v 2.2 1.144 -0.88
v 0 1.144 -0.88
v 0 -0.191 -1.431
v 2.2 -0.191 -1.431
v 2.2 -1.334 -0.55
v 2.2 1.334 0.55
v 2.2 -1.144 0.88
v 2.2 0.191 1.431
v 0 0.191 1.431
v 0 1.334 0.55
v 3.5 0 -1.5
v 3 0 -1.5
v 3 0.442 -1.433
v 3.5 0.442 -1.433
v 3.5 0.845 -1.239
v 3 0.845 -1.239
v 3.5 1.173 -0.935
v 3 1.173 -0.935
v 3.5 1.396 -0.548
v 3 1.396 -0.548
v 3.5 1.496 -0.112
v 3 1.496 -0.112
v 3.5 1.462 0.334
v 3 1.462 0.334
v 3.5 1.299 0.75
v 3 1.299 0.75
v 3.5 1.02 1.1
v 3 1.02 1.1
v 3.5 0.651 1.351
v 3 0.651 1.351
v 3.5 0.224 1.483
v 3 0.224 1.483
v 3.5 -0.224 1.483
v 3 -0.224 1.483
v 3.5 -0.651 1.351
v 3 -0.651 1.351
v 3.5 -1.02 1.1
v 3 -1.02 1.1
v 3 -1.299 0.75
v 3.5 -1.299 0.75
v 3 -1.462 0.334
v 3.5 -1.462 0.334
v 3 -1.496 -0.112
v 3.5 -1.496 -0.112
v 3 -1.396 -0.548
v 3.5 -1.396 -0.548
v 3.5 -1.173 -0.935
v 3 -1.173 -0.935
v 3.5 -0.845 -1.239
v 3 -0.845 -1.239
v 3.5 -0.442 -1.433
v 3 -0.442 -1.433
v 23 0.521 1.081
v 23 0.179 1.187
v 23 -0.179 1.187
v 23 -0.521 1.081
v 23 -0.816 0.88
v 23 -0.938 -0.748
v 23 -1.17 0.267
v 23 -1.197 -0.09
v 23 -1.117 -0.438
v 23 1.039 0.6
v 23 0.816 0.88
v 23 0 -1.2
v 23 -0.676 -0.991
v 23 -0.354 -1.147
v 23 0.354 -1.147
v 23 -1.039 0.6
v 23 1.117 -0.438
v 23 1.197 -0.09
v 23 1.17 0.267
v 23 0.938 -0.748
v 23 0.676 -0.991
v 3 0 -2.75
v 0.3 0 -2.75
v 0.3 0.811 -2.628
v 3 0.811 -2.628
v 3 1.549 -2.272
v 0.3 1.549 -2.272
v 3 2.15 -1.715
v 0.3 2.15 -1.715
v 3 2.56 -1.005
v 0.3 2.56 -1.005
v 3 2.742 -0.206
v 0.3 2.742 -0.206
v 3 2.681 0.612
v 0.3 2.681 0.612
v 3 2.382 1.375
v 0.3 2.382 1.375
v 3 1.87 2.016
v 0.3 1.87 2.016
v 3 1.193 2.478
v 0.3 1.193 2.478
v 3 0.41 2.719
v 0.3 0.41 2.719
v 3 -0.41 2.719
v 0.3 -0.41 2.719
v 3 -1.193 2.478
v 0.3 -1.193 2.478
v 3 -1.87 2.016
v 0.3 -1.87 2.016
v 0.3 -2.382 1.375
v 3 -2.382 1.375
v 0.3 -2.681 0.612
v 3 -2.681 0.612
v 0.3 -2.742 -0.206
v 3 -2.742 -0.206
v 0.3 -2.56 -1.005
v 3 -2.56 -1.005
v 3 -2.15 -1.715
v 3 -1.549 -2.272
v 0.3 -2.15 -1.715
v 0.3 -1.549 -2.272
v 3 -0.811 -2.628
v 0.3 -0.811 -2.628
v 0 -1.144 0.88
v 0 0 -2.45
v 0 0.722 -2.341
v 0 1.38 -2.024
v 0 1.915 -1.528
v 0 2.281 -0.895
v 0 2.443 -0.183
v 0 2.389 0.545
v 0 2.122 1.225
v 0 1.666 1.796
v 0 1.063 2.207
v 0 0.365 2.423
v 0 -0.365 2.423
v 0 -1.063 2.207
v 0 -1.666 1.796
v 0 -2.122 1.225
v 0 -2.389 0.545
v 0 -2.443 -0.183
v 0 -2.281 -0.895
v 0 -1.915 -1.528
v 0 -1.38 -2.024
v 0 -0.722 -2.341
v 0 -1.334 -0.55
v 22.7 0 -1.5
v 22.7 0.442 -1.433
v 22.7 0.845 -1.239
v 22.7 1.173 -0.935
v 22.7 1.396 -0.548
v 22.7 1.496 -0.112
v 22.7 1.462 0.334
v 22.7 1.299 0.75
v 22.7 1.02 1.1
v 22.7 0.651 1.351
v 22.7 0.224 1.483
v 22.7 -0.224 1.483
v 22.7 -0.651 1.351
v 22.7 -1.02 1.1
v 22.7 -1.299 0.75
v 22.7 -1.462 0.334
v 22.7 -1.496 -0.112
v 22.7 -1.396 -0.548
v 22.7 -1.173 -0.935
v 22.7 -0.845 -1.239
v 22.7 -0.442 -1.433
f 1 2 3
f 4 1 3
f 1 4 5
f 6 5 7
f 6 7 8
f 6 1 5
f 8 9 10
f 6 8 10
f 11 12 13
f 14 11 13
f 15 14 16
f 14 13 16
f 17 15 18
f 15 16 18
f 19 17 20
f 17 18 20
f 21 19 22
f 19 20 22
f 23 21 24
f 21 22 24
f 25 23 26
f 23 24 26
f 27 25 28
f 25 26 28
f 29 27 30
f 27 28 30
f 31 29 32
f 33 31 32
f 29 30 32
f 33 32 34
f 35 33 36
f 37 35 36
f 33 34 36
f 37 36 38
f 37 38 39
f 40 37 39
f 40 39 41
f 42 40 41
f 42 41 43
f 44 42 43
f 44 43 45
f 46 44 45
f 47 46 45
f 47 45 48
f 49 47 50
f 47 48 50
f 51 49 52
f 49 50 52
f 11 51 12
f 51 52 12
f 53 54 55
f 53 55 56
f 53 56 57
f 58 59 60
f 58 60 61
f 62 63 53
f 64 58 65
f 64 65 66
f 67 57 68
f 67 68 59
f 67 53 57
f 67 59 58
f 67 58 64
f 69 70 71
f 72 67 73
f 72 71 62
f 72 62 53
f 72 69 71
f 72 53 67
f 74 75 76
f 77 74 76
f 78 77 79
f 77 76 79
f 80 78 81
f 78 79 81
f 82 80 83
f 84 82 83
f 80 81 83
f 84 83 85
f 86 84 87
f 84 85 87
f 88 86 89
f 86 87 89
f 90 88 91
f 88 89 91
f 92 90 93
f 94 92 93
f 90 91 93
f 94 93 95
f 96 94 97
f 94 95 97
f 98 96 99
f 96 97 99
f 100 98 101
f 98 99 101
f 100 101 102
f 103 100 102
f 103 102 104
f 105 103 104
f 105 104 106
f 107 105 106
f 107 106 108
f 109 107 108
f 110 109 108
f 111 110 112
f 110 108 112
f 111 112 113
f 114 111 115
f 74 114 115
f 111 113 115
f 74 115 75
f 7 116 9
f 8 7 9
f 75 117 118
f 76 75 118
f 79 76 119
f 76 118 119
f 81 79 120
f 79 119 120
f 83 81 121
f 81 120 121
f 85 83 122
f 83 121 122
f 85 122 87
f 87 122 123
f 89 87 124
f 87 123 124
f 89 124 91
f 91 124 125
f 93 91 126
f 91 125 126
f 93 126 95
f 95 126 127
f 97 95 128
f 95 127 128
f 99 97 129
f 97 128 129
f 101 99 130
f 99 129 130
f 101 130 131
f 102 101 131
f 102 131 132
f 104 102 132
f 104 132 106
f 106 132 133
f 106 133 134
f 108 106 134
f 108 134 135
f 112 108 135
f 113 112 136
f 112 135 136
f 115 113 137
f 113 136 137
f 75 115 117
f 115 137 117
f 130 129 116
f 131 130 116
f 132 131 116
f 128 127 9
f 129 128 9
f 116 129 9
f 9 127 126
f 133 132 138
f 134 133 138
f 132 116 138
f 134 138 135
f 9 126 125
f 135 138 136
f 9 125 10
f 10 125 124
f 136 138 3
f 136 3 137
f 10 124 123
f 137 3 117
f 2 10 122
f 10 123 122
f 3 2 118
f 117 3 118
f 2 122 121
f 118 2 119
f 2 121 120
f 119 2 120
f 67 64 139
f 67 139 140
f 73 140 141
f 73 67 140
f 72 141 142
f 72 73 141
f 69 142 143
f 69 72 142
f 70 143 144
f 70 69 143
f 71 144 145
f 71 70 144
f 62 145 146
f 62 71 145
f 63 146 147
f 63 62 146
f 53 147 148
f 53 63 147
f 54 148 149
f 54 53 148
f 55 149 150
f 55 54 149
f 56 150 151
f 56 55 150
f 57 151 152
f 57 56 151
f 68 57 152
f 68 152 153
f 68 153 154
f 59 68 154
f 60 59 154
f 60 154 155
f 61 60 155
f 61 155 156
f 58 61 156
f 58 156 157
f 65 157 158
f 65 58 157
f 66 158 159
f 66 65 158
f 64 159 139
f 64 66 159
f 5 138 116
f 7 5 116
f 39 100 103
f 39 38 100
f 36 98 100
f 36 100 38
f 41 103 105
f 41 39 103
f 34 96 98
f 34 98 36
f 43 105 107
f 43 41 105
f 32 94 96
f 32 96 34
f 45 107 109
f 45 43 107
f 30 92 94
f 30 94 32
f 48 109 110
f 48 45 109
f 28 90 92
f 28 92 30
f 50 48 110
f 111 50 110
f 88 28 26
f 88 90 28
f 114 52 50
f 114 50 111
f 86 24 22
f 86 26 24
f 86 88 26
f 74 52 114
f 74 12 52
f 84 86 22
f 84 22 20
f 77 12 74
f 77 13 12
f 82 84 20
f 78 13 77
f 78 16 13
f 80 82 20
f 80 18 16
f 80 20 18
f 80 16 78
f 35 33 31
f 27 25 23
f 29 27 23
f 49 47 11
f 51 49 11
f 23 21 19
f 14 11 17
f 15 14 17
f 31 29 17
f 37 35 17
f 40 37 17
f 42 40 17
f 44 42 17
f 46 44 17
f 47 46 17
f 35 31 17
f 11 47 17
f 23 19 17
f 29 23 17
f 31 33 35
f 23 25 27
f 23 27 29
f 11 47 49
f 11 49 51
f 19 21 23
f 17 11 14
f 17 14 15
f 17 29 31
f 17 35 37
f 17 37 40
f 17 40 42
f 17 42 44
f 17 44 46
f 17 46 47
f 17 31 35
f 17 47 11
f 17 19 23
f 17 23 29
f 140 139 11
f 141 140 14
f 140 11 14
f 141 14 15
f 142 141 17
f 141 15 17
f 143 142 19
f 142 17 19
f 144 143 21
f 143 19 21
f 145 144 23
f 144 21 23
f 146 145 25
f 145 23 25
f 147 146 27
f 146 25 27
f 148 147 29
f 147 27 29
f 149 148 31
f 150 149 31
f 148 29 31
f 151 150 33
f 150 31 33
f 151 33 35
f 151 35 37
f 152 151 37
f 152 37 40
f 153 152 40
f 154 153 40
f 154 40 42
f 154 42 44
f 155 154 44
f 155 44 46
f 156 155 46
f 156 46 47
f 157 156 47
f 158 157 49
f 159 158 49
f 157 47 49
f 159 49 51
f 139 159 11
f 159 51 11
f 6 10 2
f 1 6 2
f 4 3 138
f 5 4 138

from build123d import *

# Parameters (mm, degrees)
SKETCH_1_R          = 2.75
EXTRUDE_1_DEPTH     = 3
SKETCH_2_R          = 1.5
EXTRUDE_2_DEPTH     = 0.5
CHAMFER_2_SIZE      = 0.3
CUT_EXTRUDE_1_DEPTH = 2.2
SKETCH_11_R         = 1.5
EXTRUDE_6_DEPTH     = 19.5
CHAMFER_3_SIZE      = 0.3


with BuildPart() as part:
    # 草图1 → 凸台-拉伸1 (new body)
    with BuildSketch(Plane(origin=(0, 0, 0), x_dir=(0, 0, -1), z_dir=(1, 0, 0))):
        Circle(SKETCH_1_R)
    extrude(amount=EXTRUDE_1_DEPTH)

    # 草图2 → 凸台-拉伸2 (add)
    with BuildSketch(Plane(origin=(3, 0, 0), x_dir=(0, 0, -1), z_dir=(1, 0, 0))):
        Circle(SKETCH_2_R)
    extrude(amount=EXTRUDE_2_DEPTH)

    # 倒角2
    chamfer_2_edges = [part.edges().sort_by_distance(p)[0] for p in [
        (0, 0, 2.75),
    ]]
    chamfer(chamfer_2_edges, length=CHAMFER_2_SIZE)

    # 草图5 → 切除-拉伸1 (cut)
    with BuildSketch(Plane.ZY):
        Polygon((1.430744137, 0.190537526), (0.550361731, 1.334329531), (-0.880382406, 1.143792006), (-1.430744137, -0.190537526), (-0.550361731, -1.334329531), (0.880382406, -1.143792006), align=None)
    extrude(amount=-CUT_EXTRUDE_1_DEPTH, mode=Mode.SUBTRACT)


with BuildPart() as body_2:
    # 草图11 → 凸台-拉伸6 (new body)
    with BuildSketch(Plane(origin=(3.5, 0, 0), x_dir=(0, 0, -1), z_dir=(1, 0, 0))):
        Circle(SKETCH_11_R)
    extrude(amount=EXTRUDE_6_DEPTH)

    # 倒角3
    chamfer_3_edges = [body_2.edges().sort_by_distance(p)[0] for p in [
        (23, 0, 1.5),
    ]]
    chamfer(chamfer_3_edges, length=CHAMFER_3_SIZE)


solid = Compound([part.part, body_2.part])
